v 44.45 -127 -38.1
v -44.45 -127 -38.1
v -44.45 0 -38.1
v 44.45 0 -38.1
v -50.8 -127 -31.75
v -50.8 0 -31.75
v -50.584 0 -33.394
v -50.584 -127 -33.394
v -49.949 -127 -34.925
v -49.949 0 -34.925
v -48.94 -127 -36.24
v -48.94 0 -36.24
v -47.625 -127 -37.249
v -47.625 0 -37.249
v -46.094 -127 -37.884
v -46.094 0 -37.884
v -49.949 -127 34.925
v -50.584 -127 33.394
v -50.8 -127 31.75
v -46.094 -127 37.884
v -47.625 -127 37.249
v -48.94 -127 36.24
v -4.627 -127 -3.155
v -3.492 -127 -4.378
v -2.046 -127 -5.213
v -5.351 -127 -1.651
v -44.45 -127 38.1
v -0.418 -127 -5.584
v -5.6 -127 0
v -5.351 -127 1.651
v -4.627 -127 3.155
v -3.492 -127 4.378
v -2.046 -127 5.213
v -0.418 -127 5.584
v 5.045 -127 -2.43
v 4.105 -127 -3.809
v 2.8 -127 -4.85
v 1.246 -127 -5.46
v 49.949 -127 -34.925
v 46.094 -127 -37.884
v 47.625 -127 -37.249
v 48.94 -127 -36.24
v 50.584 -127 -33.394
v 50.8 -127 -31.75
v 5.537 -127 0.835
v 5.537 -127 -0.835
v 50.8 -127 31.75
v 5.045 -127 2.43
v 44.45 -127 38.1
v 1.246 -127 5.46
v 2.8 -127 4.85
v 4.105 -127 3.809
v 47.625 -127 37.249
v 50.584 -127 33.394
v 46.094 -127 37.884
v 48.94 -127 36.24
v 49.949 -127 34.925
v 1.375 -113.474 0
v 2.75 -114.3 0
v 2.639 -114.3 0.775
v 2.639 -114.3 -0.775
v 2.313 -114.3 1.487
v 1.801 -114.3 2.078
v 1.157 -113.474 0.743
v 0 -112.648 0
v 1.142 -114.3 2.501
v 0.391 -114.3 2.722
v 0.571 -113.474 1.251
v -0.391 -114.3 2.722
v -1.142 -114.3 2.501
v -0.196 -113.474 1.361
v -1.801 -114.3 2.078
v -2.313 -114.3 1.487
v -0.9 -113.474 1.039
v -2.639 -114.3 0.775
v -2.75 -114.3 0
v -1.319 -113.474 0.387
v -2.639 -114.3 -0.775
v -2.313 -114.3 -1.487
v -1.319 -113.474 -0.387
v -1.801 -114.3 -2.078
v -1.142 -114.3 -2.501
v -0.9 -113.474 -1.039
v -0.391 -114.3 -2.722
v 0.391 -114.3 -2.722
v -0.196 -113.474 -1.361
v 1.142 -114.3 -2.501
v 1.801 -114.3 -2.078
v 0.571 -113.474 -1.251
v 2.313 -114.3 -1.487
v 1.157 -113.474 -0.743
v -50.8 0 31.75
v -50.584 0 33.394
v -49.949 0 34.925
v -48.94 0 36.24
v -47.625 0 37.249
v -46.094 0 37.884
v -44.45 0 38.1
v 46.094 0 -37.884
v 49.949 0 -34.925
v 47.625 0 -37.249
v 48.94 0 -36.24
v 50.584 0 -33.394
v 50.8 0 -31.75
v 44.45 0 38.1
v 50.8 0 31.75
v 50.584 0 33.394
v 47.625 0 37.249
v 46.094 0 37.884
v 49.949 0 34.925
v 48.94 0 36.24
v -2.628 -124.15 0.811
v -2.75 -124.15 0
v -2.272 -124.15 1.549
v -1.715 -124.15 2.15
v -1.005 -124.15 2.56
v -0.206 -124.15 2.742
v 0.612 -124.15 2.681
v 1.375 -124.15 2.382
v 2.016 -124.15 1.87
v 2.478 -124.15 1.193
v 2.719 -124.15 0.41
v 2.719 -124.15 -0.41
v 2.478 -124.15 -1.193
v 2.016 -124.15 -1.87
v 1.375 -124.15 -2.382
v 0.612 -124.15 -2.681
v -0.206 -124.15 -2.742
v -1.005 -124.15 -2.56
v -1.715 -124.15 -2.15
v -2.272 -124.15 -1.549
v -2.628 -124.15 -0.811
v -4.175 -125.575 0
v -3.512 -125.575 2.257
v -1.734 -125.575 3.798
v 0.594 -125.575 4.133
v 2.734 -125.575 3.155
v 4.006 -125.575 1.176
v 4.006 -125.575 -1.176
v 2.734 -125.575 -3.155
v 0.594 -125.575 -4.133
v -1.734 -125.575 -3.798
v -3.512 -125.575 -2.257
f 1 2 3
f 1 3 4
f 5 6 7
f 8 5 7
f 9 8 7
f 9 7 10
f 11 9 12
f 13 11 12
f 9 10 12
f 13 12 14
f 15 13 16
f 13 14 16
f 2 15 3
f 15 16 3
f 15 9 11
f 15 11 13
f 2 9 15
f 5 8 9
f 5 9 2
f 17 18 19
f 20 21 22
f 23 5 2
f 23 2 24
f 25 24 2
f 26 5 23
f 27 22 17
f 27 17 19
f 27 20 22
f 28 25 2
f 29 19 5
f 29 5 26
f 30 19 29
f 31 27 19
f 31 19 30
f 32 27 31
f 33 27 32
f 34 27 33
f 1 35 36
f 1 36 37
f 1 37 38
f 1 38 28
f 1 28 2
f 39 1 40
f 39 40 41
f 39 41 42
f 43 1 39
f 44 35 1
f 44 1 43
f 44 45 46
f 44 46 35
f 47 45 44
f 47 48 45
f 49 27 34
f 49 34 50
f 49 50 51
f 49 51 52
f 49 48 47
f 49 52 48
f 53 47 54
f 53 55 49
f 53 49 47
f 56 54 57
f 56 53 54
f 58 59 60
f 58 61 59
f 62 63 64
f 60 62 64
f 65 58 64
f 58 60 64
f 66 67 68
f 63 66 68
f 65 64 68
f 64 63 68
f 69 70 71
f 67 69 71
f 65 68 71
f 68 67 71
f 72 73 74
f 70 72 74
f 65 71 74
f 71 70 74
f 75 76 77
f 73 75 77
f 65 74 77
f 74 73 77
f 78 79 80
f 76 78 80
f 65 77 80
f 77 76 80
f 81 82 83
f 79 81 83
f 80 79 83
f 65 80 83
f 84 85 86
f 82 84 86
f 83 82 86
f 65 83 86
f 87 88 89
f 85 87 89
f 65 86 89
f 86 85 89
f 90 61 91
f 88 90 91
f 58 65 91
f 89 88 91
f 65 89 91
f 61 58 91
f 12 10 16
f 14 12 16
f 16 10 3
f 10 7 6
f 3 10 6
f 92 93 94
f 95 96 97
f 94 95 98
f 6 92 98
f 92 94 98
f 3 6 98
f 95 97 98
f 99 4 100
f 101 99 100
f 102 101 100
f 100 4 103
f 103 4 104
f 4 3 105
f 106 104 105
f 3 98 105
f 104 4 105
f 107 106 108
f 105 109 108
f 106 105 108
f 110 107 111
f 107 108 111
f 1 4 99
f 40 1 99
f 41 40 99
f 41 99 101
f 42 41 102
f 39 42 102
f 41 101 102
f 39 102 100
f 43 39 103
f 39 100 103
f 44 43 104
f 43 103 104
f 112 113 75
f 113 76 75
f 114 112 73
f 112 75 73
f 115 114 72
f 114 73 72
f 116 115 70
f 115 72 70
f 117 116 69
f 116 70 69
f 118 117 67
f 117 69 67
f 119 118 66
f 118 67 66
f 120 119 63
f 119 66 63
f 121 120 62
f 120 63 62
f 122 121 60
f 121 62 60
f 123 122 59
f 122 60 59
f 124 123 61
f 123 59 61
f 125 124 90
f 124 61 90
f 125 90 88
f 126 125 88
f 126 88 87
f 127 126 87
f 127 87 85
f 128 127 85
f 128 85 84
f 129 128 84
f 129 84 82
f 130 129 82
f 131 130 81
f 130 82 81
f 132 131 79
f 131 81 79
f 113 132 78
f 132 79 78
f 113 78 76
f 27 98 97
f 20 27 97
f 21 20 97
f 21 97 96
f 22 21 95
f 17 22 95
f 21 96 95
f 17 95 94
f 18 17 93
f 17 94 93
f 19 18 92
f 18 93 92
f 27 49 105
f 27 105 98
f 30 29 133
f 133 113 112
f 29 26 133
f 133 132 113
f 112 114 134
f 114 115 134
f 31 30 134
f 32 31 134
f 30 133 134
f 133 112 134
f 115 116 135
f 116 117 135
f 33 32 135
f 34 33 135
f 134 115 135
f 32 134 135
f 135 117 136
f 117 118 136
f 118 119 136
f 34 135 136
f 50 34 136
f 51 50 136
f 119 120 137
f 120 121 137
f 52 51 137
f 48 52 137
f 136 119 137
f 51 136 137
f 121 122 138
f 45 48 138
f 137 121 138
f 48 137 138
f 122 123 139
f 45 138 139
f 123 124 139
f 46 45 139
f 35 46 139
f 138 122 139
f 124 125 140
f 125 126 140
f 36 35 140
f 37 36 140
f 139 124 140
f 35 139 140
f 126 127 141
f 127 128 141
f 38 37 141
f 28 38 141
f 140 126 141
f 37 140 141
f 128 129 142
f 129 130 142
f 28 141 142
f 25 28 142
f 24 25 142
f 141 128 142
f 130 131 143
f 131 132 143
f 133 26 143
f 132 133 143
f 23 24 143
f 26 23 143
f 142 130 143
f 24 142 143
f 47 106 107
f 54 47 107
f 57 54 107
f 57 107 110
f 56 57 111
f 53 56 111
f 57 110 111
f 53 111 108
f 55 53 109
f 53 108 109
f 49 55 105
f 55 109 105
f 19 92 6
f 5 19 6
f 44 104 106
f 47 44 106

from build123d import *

# Parameters (mm, degrees)
F1_DEPTH       = 127
F3_D           = 5.5
F3_DEPTH       = 12.7
F3_CSINK_D     = 11.2
F3_CSINK_ANGLE = 90
F3_TIP         = 1.6523667023


with BuildPart() as f1:
    # F0 (on Front) → F1 (new body)
    with BuildSketch(Plane.XZ):
        with BuildLine():
            ThreePointArc((-50.8, -31.75), (-48.9401280605, -36.2401280605), (-44.45, -38.1))
            Line((-44.45, -38.1), (44.45, -38.1))
            ThreePointArc((44.45, -38.1), (48.9401280605, -36.2401280605), (50.8, -31.75))
            Line((50.8, -31.75), (50.8, 31.75))
            ThreePointArc((50.8, 31.75), (48.9401280605, 36.2401280605), (44.45, 38.1))
            Line((44.45, 38.1), (-44.45, 38.1))
            ThreePointArc((-44.45, 38.1), (-48.9401280605, 36.2401280605), (-50.8, 31.75))
            Line((-50.8, 31.75), (-50.8, -31.75))
        make_face()
    extrude(amount=F1_DEPTH)

    # F3
    with Locations(Plane.XZ.offset(127)):
        with Locations((0, 0)):
            CounterSinkHole(F3_D / 2, F3_CSINK_D / 2, depth=F3_DEPTH, counter_sink_angle=F3_CSINK_ANGLE)
            with Locations((0, 0, -(F3_DEPTH + F3_TIP / 2))):  # 118° drill point
                Cone(0, F3_D / 2, F3_TIP, mode=Mode.SUBTRACT)


solid = f1.part
